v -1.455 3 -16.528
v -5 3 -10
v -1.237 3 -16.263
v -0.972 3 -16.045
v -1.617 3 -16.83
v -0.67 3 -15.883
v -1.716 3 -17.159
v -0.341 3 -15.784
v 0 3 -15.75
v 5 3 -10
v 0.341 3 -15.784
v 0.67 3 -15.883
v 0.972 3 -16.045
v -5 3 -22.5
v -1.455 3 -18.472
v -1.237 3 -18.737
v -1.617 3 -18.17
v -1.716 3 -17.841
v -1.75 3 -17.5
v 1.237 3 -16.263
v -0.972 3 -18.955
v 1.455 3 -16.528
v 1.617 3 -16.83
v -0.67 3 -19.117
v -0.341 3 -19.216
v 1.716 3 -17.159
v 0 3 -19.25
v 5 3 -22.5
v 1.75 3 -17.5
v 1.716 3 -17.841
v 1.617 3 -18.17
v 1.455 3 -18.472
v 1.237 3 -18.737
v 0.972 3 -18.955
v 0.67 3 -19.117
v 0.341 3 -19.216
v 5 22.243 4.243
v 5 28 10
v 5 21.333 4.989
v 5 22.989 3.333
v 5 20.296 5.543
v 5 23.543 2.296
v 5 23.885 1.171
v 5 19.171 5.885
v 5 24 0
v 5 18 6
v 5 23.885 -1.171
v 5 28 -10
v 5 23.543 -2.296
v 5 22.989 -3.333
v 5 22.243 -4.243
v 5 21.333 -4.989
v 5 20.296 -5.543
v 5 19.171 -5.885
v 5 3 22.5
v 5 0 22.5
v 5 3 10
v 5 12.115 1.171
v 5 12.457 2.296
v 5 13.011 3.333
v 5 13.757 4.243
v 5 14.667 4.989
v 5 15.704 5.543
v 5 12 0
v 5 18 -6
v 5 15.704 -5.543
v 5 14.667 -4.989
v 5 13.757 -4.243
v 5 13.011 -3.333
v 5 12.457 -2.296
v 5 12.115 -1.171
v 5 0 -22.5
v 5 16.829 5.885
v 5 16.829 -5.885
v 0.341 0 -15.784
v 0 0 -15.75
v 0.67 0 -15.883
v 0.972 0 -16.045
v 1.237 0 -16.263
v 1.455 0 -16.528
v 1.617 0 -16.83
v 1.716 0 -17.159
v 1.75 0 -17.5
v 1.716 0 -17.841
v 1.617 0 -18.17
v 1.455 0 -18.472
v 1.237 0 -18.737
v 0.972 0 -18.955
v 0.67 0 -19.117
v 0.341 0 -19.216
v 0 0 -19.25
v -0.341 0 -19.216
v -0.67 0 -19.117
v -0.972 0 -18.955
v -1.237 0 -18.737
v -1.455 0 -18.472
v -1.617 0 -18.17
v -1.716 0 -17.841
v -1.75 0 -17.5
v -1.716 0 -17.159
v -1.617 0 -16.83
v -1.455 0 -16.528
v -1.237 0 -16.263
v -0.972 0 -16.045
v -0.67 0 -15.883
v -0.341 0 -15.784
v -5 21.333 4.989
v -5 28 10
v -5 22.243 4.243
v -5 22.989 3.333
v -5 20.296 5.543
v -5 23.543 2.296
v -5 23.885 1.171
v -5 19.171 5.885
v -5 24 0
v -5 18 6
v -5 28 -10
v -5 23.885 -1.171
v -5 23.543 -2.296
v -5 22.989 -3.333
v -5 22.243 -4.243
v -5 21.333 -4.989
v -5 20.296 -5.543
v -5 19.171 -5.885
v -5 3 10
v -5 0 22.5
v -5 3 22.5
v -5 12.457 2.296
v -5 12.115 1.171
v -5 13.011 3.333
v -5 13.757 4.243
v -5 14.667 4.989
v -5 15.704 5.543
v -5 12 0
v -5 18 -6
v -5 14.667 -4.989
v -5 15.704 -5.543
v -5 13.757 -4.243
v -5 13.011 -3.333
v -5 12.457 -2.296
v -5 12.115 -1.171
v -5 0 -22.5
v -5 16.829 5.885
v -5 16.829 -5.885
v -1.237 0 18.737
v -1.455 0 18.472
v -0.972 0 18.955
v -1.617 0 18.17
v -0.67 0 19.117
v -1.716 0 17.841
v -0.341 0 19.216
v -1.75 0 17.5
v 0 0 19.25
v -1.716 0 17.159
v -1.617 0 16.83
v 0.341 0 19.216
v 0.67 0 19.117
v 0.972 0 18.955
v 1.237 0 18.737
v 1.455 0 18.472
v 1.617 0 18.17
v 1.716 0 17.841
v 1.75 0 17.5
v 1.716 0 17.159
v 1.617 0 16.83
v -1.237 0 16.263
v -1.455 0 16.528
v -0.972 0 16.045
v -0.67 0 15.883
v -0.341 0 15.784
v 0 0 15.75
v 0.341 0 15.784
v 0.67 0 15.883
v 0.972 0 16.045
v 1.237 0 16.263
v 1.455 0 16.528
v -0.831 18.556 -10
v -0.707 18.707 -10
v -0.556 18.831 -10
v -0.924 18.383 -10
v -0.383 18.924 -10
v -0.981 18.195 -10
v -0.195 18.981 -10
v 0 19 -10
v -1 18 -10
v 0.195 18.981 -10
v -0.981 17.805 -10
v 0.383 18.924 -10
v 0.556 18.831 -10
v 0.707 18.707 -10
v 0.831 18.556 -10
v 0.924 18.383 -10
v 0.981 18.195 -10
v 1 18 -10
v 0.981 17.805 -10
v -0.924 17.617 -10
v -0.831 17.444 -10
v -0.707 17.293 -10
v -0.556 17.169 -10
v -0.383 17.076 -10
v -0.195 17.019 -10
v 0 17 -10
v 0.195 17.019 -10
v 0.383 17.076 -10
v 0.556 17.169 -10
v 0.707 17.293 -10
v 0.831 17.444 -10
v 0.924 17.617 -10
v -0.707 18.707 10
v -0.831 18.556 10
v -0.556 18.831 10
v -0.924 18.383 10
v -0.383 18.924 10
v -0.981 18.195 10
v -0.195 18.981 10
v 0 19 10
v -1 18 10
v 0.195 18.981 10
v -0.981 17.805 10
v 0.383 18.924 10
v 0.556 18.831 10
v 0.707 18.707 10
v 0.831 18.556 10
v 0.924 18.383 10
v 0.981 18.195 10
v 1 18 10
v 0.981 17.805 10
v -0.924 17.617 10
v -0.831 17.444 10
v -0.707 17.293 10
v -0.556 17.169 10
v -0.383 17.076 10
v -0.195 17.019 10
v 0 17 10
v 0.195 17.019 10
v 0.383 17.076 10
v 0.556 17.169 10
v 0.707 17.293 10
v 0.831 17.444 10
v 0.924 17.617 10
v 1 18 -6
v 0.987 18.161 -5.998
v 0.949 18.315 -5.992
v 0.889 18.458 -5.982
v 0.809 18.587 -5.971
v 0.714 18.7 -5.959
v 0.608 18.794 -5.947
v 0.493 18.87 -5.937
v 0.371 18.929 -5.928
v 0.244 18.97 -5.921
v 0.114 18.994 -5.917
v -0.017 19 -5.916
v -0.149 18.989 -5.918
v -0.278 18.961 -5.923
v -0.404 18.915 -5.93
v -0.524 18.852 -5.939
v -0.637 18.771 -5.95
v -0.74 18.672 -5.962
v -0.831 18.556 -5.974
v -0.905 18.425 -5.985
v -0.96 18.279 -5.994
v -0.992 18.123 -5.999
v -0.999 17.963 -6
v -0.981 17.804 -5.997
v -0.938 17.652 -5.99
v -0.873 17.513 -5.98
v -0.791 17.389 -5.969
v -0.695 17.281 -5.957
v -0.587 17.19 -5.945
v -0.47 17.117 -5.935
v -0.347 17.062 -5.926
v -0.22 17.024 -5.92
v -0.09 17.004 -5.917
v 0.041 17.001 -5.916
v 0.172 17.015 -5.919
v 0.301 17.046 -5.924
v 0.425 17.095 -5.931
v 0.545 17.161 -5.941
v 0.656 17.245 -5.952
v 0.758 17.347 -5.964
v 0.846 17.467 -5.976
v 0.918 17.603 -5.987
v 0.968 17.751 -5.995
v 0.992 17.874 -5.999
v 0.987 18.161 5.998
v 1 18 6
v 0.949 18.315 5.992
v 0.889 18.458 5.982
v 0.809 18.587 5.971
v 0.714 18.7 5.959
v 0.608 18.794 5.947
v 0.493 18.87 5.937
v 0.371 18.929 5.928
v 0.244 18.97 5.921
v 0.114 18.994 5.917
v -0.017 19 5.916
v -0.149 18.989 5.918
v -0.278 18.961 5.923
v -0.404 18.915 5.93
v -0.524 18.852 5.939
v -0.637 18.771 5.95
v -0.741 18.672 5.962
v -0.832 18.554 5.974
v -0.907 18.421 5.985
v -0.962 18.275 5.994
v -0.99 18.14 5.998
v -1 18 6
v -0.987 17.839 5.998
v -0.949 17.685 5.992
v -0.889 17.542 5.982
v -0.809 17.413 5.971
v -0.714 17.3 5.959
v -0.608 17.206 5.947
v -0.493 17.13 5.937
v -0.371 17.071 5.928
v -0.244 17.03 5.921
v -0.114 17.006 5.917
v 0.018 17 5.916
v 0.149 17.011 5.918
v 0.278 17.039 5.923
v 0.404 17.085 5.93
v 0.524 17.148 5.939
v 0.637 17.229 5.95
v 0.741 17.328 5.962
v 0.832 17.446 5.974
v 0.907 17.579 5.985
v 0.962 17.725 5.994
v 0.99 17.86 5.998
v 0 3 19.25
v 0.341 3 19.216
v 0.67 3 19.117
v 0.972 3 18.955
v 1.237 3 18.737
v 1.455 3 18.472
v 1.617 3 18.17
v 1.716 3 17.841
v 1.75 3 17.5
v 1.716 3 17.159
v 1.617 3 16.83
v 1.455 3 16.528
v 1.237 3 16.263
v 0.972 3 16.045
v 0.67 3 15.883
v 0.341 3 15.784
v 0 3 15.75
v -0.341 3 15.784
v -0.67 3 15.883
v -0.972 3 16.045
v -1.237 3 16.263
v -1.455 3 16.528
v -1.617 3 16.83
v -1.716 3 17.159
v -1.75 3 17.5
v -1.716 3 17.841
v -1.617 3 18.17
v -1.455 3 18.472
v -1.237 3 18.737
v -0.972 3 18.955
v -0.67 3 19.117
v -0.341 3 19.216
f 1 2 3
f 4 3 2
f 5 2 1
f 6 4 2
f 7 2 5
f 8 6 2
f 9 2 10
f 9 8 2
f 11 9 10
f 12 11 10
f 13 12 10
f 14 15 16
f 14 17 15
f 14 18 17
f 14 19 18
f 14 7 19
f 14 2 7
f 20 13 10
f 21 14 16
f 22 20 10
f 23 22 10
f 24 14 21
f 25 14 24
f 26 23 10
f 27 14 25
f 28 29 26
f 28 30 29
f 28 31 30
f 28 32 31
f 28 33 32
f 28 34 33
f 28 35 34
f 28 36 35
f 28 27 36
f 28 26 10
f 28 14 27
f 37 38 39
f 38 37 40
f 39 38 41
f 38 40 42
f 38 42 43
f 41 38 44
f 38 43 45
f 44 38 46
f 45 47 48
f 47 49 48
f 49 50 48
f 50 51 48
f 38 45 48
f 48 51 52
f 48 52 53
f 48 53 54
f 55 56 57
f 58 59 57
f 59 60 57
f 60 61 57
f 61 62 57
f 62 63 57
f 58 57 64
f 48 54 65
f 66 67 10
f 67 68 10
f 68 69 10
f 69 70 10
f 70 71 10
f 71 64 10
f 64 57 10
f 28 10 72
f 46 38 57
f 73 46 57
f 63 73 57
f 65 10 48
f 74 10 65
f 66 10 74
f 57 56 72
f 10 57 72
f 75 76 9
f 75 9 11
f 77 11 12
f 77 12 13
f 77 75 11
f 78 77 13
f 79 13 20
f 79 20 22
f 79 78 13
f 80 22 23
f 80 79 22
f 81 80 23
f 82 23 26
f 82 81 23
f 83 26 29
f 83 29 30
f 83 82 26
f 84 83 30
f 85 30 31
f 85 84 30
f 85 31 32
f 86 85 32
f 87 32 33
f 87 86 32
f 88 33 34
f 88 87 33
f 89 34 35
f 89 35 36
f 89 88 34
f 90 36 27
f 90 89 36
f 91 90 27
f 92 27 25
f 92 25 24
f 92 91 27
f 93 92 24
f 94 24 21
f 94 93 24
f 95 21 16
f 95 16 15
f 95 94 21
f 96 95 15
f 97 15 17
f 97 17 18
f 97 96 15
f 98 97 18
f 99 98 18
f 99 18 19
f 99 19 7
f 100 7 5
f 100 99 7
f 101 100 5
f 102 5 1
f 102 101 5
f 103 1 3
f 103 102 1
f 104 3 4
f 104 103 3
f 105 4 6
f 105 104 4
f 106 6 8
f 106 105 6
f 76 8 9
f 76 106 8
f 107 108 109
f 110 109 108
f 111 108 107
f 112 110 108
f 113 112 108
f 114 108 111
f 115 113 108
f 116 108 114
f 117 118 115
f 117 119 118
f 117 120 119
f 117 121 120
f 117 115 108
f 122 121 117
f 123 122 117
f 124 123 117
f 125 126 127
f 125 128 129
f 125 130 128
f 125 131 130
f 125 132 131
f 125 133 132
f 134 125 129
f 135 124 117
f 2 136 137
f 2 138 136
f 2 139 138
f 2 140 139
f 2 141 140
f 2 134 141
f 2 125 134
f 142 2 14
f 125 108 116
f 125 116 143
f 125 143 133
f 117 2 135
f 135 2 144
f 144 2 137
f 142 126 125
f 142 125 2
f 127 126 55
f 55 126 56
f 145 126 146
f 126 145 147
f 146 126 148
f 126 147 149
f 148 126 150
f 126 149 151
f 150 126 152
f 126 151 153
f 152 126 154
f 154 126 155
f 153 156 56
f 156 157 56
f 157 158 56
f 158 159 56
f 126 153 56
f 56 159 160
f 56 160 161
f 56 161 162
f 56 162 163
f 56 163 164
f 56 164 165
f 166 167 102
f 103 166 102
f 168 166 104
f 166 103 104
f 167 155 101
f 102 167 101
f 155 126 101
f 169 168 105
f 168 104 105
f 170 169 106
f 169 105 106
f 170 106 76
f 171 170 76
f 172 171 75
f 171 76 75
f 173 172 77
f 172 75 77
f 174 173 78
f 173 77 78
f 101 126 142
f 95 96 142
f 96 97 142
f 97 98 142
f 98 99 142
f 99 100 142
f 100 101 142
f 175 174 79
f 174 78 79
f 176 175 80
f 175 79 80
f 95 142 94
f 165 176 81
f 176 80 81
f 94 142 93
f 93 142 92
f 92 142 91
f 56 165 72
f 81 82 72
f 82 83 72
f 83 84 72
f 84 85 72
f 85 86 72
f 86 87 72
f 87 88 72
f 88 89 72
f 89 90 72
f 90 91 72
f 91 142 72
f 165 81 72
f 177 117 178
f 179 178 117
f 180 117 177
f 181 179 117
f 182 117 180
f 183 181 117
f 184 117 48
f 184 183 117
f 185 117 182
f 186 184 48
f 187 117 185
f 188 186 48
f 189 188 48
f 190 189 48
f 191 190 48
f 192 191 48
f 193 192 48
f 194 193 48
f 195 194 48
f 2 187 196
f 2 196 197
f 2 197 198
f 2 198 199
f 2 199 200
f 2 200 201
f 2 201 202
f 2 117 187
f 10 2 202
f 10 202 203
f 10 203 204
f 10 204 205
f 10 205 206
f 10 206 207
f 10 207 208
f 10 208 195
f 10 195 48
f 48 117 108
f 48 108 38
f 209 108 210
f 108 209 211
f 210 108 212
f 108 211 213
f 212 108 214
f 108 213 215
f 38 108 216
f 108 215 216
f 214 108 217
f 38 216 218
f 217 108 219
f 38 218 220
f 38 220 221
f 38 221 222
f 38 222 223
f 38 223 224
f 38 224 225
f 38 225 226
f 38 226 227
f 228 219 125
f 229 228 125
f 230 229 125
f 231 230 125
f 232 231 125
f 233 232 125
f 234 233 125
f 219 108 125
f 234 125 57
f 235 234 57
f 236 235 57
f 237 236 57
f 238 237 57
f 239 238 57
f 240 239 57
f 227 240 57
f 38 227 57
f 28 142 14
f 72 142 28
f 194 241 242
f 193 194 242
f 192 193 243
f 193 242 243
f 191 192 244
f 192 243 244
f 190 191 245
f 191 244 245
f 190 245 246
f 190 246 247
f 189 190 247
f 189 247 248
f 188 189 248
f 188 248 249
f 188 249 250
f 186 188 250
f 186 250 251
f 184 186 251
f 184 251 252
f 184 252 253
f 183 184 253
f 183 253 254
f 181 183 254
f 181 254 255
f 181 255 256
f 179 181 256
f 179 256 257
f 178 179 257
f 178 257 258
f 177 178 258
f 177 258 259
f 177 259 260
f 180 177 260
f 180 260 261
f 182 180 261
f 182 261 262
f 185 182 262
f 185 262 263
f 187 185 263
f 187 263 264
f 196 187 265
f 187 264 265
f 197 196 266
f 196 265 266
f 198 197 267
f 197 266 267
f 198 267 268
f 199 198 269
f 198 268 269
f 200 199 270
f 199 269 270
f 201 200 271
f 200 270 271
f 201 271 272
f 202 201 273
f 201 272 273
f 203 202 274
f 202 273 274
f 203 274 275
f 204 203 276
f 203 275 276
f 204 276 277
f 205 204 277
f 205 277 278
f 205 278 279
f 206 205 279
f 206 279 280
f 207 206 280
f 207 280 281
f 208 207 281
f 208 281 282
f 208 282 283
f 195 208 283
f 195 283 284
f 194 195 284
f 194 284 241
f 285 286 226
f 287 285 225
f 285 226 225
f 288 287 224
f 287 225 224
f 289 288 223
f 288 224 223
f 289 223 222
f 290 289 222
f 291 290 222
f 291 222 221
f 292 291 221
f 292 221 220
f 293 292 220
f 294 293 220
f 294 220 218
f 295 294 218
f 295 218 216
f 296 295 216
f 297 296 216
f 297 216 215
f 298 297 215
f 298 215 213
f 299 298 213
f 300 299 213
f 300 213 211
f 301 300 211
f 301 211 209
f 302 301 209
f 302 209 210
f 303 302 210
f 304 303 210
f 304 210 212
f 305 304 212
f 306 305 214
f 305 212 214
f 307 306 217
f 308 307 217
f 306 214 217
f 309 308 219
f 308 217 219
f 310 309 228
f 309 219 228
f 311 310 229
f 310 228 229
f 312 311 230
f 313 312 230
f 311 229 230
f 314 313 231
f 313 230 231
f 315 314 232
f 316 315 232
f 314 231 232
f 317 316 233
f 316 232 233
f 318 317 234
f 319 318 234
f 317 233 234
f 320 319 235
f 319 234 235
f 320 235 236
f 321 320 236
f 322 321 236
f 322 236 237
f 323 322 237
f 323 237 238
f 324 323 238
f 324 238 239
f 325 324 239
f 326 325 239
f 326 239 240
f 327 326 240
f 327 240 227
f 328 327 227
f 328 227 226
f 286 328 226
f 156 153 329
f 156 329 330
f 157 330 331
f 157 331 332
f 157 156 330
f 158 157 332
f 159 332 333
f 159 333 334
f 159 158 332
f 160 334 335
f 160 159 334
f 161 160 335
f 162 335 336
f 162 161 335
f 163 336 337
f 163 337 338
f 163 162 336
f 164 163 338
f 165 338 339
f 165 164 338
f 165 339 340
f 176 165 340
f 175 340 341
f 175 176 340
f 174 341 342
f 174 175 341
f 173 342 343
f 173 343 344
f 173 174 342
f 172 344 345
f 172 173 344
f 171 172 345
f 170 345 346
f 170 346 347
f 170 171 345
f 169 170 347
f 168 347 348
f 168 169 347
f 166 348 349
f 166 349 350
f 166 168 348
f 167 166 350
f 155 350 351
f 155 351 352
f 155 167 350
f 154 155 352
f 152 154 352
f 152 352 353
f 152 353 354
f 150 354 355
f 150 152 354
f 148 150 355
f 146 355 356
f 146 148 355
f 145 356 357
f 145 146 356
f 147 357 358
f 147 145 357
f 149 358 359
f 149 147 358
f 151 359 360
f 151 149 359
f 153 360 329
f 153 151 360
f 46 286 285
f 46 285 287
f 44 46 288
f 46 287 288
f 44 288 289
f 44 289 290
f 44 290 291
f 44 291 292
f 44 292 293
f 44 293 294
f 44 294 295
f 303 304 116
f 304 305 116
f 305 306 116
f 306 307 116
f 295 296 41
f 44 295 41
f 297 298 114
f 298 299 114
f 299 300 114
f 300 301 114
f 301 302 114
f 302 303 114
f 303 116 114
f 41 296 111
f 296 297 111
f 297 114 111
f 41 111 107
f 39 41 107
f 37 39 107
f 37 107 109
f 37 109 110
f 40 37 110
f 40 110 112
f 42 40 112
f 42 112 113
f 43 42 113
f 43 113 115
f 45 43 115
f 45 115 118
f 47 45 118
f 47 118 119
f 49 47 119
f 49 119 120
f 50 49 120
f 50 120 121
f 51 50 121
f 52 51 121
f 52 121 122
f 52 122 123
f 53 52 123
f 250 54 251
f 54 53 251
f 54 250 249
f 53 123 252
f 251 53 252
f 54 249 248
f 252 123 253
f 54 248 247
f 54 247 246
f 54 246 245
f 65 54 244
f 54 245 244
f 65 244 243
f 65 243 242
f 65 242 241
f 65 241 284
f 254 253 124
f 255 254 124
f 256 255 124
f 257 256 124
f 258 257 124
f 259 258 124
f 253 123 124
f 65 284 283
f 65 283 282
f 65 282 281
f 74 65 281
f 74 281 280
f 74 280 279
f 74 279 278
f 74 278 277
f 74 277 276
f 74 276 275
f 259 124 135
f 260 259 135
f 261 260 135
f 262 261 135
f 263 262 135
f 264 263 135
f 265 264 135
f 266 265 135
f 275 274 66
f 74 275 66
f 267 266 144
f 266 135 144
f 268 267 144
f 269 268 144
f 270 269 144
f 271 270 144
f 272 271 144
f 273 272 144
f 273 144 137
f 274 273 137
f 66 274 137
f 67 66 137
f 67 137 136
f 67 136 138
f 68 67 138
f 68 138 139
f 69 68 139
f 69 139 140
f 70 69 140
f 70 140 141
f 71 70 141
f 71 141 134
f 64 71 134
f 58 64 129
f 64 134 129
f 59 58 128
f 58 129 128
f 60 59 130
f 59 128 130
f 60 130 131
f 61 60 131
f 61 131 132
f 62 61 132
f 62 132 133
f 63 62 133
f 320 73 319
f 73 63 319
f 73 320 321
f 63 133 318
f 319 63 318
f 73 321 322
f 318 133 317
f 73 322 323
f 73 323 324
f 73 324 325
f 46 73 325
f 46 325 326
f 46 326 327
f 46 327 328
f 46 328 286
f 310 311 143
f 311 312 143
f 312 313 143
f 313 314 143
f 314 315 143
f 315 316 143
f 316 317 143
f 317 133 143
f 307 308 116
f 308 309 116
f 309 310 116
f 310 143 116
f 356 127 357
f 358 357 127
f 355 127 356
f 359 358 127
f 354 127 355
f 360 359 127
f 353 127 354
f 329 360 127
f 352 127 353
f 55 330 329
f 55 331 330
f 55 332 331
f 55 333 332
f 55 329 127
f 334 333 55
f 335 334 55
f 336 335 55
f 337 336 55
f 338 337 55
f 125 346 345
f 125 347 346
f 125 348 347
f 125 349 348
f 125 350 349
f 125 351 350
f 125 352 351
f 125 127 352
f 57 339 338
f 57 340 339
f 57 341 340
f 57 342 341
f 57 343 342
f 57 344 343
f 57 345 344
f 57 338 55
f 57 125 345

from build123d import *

# Parameters (mm, degrees)
SKETCH2_W           = 10
SKETCH2_H           = 45
SKETCH2_R           = 1.75
BOSS_EXTRUDE1_DEPTH = 3
SKETCH3_W           = 10
SKETCH3_H           = 20
BOSS_EXTRUDE2_DEPTH = 25
SKETCH4_R           = 6
CUT_EXTRUDE1_DEPTH  = 10
SKETCH5_R           = 1
CUT_EXTRUDE2_DEPTH  = 20


with BuildPart() as part:
    # Sketch2 → Boss-Extrude1 (new body)
    with BuildSketch(Plane(origin=(0, 0, 0), x_dir=(1, 0, 0), z_dir=(0, 1, 0))):
        Rectangle(SKETCH2_W, SKETCH2_H)
        with Locations(Location((0, 17.5, 0), (0, 0, 270))):
            Circle(SKETCH2_R, mode=Mode.SUBTRACT)
        with Locations(Location((0, -17.5, 0), (0, 0, 270))):
            Circle(SKETCH2_R, mode=Mode.SUBTRACT)
    extrude(amount=BOSS_EXTRUDE1_DEPTH)

    # Sketch3 → Boss-Extrude2 (add)
    with BuildSketch(Plane(origin=(0, 3, 0), x_dir=(1, 0, 0), z_dir=(0, 1, 0))):
        Rectangle(SKETCH3_W, SKETCH3_H)
    extrude(amount=BOSS_EXTRUDE2_DEPTH)

    # Sketch4 → Cut-Extrude1 (cut)
    with BuildSketch(Plane.ZY.offset(5)):
        with Locations((0, 18)):
            Circle(SKETCH4_R)
    extrude(amount=-CUT_EXTRUDE1_DEPTH, mode=Mode.SUBTRACT)

    # Sketch5 → Cut-Extrude2 (cut)
    with BuildSketch(Plane.XY.offset(10)):
        with Locations((0, 18)):
            Circle(SKETCH5_R)
    extrude(amount=-CUT_EXTRUDE2_DEPTH, mode=Mode.SUBTRACT)


solid = part.part
